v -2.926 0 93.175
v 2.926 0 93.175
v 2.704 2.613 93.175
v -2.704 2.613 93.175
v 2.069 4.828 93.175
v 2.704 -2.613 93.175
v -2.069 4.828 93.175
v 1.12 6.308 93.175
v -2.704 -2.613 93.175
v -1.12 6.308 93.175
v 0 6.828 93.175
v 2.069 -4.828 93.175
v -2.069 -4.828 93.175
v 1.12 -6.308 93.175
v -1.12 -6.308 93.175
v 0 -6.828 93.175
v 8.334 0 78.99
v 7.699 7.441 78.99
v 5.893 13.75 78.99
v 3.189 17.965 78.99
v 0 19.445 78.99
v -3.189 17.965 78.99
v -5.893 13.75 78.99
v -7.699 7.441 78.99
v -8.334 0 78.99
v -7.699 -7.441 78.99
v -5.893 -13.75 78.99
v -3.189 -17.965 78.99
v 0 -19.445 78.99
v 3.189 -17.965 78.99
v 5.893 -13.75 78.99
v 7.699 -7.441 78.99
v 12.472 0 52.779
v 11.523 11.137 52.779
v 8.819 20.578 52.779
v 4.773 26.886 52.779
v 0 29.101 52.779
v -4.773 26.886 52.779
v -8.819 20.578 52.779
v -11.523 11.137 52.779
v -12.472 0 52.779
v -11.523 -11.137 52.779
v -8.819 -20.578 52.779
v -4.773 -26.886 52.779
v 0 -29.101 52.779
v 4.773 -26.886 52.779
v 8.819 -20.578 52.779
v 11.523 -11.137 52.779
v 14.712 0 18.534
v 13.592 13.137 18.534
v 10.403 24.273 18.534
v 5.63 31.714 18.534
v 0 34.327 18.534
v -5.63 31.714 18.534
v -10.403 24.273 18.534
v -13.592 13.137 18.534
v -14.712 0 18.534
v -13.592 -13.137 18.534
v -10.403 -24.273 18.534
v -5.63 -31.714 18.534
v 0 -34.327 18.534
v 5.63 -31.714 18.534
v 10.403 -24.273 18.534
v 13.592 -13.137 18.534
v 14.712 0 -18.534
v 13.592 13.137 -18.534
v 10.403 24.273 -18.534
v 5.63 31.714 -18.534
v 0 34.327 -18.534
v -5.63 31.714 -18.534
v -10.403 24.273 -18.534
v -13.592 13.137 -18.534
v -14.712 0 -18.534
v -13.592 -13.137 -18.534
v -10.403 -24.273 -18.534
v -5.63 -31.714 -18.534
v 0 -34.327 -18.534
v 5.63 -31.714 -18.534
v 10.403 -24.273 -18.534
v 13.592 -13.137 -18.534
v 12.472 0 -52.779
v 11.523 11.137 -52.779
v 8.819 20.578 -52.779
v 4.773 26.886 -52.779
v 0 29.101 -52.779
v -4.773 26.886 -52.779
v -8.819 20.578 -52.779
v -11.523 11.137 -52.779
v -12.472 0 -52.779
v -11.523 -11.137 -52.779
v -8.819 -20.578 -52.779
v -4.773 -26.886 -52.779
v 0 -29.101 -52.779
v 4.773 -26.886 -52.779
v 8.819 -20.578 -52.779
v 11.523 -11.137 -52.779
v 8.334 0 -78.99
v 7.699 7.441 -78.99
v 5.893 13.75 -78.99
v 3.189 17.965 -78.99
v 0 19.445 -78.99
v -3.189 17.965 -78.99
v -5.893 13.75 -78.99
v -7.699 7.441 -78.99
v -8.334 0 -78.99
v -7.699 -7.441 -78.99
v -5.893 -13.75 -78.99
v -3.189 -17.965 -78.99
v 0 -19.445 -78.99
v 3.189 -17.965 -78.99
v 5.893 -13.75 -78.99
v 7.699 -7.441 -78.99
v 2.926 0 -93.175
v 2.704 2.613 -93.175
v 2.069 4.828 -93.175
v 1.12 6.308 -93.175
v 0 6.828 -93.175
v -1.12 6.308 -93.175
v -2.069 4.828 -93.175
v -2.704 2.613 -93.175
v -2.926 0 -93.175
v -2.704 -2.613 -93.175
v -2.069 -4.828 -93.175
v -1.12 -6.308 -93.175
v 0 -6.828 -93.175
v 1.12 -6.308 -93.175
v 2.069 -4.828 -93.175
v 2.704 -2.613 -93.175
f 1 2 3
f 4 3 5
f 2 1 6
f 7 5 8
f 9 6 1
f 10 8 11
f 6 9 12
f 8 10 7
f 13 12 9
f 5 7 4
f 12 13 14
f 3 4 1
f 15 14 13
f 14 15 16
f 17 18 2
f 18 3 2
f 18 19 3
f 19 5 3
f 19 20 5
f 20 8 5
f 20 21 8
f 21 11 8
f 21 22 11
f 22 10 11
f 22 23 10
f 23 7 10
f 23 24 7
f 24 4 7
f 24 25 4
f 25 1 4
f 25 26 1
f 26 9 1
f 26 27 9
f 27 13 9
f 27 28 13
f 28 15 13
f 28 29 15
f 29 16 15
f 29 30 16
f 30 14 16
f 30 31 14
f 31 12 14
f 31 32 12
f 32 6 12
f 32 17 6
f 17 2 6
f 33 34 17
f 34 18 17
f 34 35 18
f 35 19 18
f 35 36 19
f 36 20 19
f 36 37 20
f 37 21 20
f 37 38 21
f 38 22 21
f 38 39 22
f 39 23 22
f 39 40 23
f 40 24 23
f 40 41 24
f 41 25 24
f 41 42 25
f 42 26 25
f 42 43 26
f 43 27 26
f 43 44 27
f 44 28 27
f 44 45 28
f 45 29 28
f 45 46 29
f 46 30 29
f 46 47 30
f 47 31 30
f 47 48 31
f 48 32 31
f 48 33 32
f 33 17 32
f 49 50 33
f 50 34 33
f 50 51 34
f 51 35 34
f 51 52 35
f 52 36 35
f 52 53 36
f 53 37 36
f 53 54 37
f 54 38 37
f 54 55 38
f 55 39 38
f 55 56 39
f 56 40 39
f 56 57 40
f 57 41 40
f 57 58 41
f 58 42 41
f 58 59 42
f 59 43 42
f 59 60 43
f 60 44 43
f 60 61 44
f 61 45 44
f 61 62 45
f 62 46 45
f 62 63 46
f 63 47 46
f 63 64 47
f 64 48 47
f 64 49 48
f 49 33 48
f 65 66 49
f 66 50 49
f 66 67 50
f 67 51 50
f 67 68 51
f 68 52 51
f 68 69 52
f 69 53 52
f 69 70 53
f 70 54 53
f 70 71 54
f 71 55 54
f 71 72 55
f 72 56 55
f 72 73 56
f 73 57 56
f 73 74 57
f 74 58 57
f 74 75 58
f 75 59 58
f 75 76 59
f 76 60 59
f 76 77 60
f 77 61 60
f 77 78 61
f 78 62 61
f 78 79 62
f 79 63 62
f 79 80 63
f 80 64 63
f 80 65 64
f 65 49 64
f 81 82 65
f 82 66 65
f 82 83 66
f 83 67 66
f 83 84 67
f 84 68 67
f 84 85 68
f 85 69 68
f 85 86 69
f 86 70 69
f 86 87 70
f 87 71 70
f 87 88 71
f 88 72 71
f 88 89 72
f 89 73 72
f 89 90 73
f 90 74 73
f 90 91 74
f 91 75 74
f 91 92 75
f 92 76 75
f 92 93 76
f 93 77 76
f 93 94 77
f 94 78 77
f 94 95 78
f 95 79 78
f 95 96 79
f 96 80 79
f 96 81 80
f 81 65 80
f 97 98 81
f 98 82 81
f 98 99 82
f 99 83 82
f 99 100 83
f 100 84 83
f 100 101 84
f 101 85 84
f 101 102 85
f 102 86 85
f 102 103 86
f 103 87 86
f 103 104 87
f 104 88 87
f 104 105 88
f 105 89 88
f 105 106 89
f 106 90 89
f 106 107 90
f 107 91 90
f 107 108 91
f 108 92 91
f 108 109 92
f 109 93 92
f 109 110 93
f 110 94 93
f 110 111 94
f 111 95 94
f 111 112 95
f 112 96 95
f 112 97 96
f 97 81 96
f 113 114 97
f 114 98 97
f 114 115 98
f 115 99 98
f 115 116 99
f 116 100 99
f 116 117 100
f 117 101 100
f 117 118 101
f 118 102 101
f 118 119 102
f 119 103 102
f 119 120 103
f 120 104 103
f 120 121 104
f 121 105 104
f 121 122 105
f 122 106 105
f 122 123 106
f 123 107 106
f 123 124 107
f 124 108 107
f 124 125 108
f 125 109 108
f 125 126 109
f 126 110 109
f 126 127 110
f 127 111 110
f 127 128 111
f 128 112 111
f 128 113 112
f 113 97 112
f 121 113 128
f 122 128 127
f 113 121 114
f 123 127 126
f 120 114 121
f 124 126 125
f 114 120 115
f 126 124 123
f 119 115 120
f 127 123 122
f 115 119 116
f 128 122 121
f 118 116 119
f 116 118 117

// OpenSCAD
// Generated by SolidPython 1.0.1 on 2020-07-29 00:46:45


scale(v = [3, 7, 19]) {
	sphere(r = 5);
}
/***********************************************
*********      SolidPython code:      **********
************************************************
 
# import packages: SolidPython
from solid import *
from solid.utils import *
from itertools import chain, combinations, permutations


class Resize:

    def __init__(self, scad_file):
        self.scad_file = scad_file
        #self.scad_file = import_scad(scad_file)
        # cone/cylinder param:
        self.r1 = 0
        self.r2 = 0
        self.h = 0
        # rectangular prism param:
        self.w = 0
        self.l = 0
        # ellipse param:
        self.r = 0

    # import OpenScad code (file name corresponds to shape)


    # classify shape + parameters
    def assign(self, param1, param2, param3):
        if self.scad_file == 'cone.scad':
            self.r1 = param1
            self.r2 = param2
            self.h = param3
        elif self.scad_file == 'cylinder.scad':
            self.r1 = param1
            self.r2 = param2
            self.h = param3
        elif self.scad_file == 'rectangularPrism.scad':
            self.h = param1
            self.l = param2
            self.w = param3
        else:
            self.r = param1
            self.h = param2

    # resize parameters
    def iterate(self):
        x = range(3, 20, 2)
        i = 1
        if self.scad_file == 'cone.scad':
            tempList = list(permutations(x, 2))
            for temp in tempList:
                param1 = temp[0]
                param2 = temp[1]
                filepath = 'produced_scad_files/' + 'cone' + str(param1) + '_' + str(param2) + '_' + '.scad'
                scad_render_to_file(cylinder(h=param1, r1=param2, r2=0), filepath)

        elif self.scad_file == 'cylinder.scad':
            tempList = list(permutations(x, 3))
            for temp in tempList:
                param1 = temp[0]
                param2 = temp[1]
                filepath = 'produced_scad_files/' + 'cylinder' + str(param1) + '_' + str(param2) + '_' + '.scad'
                scad_render_to_file(cylinder(h=param1, r1=param2, r2=param2), filepath)

        elif self.scad_file == 'rectangularPrism.scad':
            tempList = list(permutations(x, 3))
            for temp in tempList:
                param1 = temp[0]
                param2 = temp[1]
                param3 = temp[2]
                filepath = 'produced_scad_files/' + 'rectangularPrism' + str(param1) + '_' + str(param2) + '_' + str(
                    param3) + '.scad'
                scad_render_to_file(cube(size=(param1, param2, param3)), filepath)

        elif self.scad_file == 'ellipse.scad':
            tempList = list(permutations(x, 4))
            for temp in tempList:
                param1 = temp[0]
                param2 = temp[1]
                param3 = temp[2]
                param4 = temp[3]
                filepath = 'produced_scad_files/' + 'ellipse' + str(param1) + '_' + str(param2) + '_' + str(param3) + '_' + str(param4) + '.scad'
                scad_render_to_file(scale([param1, param2, param3])(sphere(r=param4)), filepath)

    def render_to_scadfile(self):
        scad_render_to_file(scad, 'example.scad') 
 
************************************************/
